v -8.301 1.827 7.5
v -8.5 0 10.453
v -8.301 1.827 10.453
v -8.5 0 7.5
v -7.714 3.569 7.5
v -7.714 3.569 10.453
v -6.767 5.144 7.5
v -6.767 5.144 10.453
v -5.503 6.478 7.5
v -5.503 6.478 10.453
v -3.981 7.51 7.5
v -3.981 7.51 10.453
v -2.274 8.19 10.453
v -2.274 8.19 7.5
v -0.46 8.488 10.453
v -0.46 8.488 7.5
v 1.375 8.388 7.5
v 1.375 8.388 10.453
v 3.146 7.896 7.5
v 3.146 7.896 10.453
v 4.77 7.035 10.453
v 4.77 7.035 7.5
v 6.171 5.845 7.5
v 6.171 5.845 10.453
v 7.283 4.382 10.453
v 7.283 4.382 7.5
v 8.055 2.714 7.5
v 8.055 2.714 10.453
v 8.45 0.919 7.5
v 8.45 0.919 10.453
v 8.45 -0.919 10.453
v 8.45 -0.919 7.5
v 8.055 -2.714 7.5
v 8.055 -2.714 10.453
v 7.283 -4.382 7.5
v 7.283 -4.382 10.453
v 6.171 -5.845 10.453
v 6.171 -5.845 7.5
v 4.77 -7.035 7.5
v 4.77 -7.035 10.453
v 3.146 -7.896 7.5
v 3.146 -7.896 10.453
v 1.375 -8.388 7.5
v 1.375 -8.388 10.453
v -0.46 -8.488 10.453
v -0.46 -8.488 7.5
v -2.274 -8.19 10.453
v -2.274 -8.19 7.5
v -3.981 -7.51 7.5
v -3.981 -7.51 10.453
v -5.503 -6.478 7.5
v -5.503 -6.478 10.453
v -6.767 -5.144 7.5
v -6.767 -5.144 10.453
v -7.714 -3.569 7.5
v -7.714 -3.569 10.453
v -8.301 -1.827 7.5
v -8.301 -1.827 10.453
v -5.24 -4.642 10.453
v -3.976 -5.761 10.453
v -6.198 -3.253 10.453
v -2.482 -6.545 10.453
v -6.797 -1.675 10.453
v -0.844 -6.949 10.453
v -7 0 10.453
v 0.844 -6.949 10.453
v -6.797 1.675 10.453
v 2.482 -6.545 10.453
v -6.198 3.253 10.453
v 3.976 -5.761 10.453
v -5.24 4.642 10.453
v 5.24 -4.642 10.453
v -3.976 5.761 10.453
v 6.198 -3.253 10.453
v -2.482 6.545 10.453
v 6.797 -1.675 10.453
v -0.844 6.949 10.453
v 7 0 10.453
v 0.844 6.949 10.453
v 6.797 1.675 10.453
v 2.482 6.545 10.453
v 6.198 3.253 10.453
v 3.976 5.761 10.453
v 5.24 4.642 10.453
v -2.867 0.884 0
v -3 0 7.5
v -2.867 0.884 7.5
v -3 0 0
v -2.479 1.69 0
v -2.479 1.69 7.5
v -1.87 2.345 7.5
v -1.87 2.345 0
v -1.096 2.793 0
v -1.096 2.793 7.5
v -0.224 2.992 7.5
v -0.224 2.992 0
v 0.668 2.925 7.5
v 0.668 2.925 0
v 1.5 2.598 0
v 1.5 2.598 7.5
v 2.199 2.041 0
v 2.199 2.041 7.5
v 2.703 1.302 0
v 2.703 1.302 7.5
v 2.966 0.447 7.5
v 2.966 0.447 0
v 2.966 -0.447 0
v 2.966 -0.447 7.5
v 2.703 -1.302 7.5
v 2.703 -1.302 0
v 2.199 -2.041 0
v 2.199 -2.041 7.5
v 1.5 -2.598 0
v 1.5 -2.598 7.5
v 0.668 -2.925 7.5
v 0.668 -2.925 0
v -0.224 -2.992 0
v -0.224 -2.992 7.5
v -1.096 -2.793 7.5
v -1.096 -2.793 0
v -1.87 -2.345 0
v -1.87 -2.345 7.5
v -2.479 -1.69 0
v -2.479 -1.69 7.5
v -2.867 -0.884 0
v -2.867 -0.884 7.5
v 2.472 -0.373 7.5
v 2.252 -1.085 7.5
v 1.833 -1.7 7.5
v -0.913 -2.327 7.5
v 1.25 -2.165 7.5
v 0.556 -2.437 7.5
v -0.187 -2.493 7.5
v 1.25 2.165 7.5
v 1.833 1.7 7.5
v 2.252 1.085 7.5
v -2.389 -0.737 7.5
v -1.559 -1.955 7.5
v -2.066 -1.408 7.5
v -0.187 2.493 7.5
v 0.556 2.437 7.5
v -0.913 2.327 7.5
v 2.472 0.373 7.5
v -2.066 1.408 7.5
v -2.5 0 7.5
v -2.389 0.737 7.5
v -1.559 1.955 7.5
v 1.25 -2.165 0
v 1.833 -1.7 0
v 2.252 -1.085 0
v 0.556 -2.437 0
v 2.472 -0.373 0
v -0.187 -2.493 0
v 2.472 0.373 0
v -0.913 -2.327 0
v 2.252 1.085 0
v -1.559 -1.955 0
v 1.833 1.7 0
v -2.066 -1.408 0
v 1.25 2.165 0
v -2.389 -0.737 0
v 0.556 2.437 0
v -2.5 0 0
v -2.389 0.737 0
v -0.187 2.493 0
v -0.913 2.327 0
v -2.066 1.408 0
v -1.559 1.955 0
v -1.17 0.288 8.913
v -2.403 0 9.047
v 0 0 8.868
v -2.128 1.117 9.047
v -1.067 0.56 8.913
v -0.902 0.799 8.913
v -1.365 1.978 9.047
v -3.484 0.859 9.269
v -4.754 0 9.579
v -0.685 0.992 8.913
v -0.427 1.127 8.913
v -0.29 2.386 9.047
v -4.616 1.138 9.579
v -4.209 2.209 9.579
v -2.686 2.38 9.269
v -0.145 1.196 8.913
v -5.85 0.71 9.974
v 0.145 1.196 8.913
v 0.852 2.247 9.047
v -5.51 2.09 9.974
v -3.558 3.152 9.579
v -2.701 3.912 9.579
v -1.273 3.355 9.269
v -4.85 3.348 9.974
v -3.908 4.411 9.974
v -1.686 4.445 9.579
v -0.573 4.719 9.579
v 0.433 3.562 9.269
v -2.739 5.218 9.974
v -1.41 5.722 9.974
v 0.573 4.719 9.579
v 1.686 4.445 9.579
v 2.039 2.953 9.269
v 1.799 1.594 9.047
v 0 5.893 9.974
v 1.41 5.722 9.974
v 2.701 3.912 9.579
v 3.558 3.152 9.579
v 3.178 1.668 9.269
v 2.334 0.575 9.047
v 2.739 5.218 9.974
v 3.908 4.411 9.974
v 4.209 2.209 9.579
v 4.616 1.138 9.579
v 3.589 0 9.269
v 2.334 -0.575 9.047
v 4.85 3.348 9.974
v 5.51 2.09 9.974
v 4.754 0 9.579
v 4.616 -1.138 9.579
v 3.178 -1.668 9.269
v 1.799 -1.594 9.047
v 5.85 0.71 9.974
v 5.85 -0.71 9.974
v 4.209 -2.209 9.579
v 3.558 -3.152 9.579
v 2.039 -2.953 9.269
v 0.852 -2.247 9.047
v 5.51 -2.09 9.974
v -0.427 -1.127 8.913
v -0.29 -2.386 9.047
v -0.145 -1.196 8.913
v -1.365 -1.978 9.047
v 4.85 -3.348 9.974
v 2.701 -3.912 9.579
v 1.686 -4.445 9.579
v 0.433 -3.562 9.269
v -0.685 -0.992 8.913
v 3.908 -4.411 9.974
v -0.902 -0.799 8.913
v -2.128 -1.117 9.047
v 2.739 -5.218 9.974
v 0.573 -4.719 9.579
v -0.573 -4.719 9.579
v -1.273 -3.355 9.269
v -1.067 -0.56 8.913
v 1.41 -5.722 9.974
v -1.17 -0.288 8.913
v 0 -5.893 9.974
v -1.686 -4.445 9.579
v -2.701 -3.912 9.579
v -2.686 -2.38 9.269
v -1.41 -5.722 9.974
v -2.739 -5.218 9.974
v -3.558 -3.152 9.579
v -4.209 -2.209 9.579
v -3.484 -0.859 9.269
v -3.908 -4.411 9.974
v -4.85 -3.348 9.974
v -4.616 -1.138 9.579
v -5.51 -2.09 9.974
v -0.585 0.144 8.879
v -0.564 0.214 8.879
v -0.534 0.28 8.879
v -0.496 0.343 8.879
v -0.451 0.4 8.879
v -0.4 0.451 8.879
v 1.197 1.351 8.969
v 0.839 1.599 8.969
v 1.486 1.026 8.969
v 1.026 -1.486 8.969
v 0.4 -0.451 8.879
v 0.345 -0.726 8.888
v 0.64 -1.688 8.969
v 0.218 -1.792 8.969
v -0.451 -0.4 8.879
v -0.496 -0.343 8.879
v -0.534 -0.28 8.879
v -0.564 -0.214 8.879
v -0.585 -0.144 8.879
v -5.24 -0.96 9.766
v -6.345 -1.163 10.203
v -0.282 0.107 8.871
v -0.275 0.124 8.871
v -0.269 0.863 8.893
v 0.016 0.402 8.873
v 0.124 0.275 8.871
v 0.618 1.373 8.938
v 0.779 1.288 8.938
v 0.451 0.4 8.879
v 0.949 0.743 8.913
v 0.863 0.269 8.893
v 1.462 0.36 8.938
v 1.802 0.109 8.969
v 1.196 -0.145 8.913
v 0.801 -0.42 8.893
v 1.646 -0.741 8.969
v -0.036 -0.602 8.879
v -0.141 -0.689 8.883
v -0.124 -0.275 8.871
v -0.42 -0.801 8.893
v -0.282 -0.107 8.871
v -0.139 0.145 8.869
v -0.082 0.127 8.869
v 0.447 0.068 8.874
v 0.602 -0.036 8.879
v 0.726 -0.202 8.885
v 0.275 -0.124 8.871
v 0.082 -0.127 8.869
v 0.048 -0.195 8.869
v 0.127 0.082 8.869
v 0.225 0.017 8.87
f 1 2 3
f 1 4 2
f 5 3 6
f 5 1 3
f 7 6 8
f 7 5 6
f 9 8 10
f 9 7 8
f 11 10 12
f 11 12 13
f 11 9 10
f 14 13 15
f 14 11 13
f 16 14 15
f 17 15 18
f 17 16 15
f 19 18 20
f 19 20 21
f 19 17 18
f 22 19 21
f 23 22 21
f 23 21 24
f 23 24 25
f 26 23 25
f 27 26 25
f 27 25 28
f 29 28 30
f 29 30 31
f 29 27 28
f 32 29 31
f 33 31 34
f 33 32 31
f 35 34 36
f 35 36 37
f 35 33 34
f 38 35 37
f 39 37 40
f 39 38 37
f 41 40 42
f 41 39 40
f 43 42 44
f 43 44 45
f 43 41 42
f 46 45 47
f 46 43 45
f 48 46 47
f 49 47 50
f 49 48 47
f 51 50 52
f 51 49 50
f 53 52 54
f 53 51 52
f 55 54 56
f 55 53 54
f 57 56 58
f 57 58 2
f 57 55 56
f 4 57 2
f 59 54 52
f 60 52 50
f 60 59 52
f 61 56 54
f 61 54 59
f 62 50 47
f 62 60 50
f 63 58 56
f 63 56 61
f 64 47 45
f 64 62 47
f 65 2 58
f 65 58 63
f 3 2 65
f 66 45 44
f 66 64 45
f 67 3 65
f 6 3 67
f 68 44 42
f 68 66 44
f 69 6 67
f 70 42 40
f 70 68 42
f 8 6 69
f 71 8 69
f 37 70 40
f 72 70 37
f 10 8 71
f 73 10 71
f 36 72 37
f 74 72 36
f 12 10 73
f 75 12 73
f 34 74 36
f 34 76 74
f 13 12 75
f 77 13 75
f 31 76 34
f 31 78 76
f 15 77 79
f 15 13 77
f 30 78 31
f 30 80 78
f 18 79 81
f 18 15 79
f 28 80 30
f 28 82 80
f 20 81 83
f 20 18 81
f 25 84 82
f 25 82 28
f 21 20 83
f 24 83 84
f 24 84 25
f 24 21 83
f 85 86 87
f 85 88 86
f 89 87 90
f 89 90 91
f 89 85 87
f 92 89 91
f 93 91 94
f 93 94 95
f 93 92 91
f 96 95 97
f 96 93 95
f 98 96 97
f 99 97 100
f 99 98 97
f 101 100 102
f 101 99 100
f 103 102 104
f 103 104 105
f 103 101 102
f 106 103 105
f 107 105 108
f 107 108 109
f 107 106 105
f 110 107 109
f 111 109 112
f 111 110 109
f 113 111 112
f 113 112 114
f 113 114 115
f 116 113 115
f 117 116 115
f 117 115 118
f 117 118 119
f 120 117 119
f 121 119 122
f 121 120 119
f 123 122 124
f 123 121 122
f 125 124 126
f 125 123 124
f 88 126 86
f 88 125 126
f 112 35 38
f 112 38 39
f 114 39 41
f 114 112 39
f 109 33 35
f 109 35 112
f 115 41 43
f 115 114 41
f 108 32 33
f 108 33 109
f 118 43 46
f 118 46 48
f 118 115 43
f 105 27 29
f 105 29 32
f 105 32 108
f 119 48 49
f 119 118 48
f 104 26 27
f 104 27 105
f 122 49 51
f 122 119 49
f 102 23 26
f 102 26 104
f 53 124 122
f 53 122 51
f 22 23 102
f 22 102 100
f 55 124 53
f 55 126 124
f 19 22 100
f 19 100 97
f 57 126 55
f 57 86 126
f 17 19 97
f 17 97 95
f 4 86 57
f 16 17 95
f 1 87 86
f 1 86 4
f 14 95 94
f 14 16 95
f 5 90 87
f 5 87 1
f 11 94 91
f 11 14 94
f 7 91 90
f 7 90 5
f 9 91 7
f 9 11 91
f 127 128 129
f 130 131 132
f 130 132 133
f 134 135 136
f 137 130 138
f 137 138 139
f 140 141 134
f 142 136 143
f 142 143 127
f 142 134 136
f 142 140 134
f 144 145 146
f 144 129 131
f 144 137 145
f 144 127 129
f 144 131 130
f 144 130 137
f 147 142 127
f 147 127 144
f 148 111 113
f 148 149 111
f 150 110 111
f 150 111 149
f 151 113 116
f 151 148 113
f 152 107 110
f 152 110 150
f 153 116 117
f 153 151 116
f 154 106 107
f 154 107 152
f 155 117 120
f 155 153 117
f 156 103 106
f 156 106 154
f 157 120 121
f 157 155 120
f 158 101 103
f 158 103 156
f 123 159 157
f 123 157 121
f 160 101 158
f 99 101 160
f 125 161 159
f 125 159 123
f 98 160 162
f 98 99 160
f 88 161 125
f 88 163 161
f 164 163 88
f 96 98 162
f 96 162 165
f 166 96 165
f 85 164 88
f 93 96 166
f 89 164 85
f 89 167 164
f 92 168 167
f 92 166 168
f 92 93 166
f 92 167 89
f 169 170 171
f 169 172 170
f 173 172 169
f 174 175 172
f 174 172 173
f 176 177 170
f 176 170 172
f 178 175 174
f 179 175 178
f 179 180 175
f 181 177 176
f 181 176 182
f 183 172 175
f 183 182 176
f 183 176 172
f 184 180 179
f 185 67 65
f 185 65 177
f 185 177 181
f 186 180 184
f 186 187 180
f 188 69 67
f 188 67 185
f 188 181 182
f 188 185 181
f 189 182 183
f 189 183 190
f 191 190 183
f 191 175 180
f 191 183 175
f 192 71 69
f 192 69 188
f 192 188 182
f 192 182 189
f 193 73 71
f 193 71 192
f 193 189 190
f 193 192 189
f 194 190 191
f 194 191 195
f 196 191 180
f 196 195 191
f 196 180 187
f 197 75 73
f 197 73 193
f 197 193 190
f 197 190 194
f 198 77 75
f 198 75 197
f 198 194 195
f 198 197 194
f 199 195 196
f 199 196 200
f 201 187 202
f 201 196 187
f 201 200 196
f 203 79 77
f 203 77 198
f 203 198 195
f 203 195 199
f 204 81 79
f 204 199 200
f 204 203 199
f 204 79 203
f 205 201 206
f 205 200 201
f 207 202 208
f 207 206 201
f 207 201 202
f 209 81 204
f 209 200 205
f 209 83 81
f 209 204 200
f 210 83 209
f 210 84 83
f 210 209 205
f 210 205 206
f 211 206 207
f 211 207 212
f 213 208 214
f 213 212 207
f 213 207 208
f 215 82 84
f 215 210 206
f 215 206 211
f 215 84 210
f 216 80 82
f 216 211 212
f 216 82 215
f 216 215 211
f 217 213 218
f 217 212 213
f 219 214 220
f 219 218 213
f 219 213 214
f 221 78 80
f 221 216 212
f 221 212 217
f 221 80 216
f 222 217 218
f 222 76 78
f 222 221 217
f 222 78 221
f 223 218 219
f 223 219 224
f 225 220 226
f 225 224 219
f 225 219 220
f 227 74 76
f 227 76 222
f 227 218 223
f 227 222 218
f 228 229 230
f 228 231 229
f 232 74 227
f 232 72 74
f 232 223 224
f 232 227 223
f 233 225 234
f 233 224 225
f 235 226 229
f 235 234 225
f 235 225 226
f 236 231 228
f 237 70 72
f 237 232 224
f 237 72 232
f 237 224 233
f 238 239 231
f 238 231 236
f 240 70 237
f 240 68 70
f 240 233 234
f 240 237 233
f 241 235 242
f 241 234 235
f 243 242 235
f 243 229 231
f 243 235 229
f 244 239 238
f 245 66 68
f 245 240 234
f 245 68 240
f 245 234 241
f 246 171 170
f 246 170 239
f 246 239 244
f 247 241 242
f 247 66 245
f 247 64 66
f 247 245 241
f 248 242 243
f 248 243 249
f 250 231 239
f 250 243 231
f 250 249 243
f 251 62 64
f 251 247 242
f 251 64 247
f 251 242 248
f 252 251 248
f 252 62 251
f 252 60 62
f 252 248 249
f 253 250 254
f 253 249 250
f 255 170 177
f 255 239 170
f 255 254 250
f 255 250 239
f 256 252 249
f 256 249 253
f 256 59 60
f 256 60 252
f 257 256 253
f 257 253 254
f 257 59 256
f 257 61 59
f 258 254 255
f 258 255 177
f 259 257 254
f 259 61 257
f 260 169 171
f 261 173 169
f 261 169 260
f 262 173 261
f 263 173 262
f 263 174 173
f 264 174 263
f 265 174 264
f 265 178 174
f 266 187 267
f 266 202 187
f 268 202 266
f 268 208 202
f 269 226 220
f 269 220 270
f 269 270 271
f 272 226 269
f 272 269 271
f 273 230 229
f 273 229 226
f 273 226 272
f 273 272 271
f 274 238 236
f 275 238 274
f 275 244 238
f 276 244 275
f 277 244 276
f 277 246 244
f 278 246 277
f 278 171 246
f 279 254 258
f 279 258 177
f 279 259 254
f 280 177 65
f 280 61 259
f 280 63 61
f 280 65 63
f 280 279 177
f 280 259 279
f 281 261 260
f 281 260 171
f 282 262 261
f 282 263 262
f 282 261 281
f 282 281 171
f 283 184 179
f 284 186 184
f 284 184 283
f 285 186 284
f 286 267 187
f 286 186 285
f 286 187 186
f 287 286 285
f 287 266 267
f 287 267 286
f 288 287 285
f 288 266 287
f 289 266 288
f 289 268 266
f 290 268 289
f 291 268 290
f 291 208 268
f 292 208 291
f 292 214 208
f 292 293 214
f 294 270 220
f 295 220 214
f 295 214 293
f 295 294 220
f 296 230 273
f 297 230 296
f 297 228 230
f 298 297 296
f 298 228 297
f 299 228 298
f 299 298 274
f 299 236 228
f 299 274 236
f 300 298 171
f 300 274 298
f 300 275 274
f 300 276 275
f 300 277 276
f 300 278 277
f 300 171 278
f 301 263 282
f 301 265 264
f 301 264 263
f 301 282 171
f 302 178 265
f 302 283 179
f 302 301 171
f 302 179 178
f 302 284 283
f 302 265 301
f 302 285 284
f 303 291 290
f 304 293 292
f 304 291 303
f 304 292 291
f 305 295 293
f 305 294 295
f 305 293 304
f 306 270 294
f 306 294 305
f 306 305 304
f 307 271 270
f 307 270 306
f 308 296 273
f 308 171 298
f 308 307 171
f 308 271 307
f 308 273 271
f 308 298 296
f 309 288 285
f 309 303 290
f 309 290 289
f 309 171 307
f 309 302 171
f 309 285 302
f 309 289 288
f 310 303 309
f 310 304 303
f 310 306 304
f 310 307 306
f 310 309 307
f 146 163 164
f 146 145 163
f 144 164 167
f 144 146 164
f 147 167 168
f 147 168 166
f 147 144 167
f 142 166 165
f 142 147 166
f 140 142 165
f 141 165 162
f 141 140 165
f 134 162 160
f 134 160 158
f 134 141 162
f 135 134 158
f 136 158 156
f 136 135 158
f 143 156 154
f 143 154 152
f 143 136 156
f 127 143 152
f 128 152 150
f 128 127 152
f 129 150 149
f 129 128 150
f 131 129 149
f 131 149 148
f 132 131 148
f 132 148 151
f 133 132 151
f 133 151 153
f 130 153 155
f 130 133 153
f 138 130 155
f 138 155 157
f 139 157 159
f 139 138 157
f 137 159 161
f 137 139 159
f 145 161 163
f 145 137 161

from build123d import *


with BuildPart() as f1:
    # F0 (on Front) → F1 (revolve)
    with BuildSketch(Plane.XZ):
        with BuildLine():
            Line((-3, 7.5), (-3, 0))
            Line((-3, 0), (-2.5, 0))
            Line((-2.5, 0), (-2.5, 7.5))
            Line((-2.5, 7.5), (0, 7.5))
            Line((0, 7.5), (0, 8.867949))
            ThreePointArc((0, 8.867949), (-3.588595, 9.269139), (-7, 10.452899))
            Line((-7, 10.452899), (-8.5, 10.452899))
            Line((-8.5, 10.452899), (-8.5, 7.5))
            Line((-8.5, 7.5), (-3, 7.5))
        make_face()
    revolve(axis=Axis((0, 0, 8.183975), (0, 0, -1)))


solid = f1.part
